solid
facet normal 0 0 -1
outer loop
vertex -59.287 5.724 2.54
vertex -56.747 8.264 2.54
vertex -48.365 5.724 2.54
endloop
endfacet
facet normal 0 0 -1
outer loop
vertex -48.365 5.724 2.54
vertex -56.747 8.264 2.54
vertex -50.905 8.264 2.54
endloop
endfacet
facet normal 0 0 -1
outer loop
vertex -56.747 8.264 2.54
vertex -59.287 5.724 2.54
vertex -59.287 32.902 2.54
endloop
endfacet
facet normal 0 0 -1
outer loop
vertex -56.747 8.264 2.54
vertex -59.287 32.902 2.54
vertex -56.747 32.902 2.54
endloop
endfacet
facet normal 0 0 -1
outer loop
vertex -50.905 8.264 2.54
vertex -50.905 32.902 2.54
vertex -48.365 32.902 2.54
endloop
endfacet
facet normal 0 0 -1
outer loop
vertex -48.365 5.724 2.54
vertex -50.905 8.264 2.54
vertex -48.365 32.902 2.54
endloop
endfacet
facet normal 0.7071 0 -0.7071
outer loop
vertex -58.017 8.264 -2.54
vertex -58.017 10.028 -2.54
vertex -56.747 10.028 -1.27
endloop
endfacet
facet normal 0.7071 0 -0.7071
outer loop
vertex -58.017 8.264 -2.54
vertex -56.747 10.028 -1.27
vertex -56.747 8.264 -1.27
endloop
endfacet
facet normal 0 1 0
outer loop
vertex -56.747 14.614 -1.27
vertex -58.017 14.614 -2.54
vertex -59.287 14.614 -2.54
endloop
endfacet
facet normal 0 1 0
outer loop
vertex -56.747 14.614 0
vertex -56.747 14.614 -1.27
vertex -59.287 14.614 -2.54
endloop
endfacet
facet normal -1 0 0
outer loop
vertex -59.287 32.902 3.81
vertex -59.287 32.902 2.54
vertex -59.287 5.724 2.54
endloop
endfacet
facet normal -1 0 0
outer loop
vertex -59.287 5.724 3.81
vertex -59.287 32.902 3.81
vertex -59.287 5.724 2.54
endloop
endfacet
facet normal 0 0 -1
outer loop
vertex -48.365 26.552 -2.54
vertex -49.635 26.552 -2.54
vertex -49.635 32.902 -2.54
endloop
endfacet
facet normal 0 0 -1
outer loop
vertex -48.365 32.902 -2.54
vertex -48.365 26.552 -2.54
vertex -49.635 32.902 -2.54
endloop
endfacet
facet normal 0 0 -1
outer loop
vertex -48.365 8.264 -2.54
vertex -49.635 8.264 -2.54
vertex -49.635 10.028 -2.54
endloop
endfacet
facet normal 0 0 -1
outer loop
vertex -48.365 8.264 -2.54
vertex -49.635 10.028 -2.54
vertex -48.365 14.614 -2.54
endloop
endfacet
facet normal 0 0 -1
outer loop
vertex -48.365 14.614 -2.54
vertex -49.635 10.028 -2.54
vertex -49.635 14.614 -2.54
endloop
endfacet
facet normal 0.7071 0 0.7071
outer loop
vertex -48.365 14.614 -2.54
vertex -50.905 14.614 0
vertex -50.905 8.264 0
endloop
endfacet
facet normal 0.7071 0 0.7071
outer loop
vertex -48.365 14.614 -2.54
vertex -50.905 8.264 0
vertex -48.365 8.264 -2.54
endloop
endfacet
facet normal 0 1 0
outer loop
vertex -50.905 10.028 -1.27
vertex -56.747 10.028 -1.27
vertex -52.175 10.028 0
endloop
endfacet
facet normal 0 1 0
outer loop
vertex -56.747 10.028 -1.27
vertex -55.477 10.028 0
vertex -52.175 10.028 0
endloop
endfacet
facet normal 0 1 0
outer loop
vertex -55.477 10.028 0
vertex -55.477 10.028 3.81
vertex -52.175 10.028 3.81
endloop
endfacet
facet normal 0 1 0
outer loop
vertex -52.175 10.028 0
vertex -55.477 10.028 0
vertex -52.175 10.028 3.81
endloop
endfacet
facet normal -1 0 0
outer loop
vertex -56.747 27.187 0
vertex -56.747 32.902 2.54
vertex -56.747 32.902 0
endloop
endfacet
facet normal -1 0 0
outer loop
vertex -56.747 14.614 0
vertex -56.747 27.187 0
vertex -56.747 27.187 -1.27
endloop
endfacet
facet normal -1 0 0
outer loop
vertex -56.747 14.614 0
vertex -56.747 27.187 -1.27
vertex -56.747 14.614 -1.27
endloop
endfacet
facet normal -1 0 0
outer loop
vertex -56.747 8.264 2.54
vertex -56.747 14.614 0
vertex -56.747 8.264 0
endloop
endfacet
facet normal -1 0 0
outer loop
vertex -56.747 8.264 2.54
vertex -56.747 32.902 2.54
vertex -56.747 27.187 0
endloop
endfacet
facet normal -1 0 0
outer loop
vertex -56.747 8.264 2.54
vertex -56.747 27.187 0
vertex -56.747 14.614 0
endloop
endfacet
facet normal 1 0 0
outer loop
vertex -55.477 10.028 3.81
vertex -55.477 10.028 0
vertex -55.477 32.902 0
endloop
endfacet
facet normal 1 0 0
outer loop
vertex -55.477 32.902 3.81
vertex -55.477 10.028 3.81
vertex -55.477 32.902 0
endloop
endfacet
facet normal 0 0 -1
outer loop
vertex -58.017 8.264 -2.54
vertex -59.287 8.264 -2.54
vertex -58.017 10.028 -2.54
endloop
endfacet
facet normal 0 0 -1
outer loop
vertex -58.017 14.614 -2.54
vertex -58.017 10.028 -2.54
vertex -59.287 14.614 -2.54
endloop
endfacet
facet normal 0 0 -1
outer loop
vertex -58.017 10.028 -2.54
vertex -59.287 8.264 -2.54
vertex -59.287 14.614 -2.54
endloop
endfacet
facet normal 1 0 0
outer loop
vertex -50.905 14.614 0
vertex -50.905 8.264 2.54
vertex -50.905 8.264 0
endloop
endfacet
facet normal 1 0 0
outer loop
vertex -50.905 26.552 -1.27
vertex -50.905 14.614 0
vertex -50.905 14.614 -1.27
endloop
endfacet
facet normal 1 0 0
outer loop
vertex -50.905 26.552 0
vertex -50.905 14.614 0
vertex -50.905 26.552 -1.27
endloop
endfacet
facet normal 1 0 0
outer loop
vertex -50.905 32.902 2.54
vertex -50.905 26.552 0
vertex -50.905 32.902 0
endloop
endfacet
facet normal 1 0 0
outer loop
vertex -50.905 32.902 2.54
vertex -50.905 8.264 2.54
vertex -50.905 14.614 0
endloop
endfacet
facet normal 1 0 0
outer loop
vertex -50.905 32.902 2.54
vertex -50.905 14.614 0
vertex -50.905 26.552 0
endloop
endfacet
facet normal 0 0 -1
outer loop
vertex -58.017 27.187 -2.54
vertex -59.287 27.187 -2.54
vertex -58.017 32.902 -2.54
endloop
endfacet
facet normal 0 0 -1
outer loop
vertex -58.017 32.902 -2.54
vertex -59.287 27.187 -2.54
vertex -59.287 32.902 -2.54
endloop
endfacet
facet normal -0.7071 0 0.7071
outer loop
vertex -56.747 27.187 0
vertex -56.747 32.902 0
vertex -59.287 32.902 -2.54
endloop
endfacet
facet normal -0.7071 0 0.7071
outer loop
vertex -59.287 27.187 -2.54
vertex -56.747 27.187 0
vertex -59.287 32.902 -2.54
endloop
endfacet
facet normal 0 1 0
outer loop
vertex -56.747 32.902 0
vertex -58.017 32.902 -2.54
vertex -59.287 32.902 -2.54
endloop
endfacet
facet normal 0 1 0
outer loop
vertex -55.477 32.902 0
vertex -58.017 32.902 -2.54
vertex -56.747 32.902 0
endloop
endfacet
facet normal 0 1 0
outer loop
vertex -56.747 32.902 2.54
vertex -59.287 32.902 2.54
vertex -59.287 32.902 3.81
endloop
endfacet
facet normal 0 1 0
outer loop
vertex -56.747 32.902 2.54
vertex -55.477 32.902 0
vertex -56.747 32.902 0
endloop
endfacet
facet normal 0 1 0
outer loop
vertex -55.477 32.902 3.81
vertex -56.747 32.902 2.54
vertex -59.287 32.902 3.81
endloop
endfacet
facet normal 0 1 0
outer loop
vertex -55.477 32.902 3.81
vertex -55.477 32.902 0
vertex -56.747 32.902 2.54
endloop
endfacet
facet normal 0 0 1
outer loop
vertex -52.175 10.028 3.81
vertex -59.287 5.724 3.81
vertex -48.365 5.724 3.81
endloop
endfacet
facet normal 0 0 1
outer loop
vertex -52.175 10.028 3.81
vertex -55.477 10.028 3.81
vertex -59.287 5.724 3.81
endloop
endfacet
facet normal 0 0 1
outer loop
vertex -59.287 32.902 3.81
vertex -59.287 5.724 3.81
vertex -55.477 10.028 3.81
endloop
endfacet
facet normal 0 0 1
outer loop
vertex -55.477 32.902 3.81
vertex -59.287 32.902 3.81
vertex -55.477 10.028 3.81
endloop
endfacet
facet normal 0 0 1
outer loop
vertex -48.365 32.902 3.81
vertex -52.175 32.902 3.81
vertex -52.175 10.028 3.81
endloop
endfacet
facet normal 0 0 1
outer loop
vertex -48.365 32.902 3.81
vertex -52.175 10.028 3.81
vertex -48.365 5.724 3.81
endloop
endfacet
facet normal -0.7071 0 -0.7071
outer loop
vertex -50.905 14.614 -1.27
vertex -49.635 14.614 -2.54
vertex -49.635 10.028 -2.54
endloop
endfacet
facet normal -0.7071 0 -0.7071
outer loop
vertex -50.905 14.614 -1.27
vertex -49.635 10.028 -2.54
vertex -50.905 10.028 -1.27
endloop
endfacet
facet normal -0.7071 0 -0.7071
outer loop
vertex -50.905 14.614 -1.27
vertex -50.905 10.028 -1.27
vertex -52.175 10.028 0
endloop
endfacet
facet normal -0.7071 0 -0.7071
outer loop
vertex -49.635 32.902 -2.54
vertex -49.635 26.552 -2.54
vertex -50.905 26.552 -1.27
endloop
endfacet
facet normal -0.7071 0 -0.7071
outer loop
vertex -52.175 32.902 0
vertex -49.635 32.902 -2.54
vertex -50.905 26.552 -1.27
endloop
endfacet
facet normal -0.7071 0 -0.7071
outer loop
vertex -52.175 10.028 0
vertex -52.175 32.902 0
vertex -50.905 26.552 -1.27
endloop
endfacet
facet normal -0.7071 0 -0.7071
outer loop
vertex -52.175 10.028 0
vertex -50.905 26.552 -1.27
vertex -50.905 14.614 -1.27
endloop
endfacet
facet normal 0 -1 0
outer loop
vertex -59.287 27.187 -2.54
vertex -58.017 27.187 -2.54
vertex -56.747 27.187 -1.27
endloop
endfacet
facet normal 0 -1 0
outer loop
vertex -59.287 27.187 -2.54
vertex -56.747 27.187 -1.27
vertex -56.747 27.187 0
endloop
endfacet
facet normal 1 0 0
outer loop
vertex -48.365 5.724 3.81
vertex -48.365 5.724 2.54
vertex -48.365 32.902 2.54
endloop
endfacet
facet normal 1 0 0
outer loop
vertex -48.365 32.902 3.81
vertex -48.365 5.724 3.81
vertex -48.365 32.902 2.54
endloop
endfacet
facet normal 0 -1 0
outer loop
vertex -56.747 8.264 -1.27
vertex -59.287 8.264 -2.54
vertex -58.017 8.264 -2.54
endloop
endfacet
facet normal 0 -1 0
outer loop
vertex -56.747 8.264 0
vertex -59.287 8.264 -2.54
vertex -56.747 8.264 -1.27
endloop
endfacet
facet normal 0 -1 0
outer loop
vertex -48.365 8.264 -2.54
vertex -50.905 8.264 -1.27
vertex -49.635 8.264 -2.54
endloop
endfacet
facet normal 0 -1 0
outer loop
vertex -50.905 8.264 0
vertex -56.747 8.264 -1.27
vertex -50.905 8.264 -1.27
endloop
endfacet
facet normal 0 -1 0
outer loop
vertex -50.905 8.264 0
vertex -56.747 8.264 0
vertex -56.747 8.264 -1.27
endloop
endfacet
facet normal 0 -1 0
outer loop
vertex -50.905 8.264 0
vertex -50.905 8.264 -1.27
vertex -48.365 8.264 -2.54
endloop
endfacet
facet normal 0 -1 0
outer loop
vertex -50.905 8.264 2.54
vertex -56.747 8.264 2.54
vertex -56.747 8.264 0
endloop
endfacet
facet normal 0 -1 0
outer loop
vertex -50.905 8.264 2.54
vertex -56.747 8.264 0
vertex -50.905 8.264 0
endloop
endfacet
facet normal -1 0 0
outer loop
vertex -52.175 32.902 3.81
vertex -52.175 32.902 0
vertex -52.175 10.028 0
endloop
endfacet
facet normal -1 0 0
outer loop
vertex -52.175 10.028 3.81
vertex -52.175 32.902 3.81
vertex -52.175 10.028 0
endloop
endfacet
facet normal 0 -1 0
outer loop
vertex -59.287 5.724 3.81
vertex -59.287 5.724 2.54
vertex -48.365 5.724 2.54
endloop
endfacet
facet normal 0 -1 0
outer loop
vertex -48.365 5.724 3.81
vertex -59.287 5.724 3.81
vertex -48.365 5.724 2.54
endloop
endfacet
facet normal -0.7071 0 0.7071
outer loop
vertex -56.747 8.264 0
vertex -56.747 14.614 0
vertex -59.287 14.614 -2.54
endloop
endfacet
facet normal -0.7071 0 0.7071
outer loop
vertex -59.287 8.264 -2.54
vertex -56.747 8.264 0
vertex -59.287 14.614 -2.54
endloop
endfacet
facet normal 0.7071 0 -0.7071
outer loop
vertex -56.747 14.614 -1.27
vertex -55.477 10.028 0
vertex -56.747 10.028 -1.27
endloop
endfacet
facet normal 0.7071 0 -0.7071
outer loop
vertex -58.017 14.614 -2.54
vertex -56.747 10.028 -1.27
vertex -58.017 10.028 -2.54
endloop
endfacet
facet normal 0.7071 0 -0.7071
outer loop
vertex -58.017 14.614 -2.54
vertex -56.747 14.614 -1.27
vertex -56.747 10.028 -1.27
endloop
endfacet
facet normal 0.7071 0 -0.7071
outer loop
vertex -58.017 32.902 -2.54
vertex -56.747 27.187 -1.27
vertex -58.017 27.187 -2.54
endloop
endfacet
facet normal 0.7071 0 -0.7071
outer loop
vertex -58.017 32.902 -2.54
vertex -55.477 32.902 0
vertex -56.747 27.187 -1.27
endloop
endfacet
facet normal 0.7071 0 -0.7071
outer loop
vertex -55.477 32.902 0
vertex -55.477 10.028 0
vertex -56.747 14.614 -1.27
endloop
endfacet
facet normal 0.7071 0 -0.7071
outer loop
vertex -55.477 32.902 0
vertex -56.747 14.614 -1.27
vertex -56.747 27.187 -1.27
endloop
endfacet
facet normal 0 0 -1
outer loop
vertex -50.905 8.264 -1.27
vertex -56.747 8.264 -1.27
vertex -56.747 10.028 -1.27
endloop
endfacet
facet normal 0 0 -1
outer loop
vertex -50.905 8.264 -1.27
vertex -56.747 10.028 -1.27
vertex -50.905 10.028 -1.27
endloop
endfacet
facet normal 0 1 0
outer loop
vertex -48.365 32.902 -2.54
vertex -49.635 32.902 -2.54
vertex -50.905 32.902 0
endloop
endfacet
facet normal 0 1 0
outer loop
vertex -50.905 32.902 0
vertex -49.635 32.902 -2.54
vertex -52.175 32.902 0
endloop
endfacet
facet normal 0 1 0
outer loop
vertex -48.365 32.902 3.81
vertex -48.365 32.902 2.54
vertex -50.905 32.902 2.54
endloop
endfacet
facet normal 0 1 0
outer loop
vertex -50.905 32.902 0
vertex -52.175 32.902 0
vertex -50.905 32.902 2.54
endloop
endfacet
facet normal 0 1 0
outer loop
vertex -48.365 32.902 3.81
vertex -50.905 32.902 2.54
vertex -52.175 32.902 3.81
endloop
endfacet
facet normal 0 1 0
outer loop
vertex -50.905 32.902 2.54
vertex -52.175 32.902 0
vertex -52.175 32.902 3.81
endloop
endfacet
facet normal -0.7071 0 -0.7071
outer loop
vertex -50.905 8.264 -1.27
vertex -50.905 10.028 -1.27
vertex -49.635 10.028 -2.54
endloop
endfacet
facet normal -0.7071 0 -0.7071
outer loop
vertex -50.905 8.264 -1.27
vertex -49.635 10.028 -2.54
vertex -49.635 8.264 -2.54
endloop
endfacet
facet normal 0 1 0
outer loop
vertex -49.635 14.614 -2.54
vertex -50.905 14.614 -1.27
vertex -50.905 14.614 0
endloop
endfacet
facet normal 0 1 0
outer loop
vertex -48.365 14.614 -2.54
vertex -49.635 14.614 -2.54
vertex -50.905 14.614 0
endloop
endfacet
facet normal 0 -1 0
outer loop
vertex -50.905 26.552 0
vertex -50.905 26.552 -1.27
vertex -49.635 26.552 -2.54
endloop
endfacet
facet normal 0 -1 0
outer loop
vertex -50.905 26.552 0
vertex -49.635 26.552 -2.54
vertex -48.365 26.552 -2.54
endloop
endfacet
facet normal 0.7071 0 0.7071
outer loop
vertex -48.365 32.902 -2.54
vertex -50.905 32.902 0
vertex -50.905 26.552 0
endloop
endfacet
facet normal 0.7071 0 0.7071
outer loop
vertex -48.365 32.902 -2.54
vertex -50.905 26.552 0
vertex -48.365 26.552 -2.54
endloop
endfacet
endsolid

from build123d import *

# Parameters (mm, degrees)
F1_DEPTH      = 2.54
F1_DEPTH_BACK = 2.54
F2_W          = 3.81
F2_H          = 24.638
F2_W_2        = 2.54
F3_DEPTH      = 1.27
F4_W          = 5.715
F4_H          = 2.54
F4_W_2        = 6.35
F6_DEPTH      = 2.54
F5_W          = 6.35
F5_H          = 2.54
F7_DEPTH      = 2.54
F8_T1_DEPTH   = 22.8740361466
F8_T6_DEPTH   = 6.35
F8_T11_DEPTH  = 6.35
F8_T16_DEPTH  = 6.35
F8_T21_DEPTH  = 5.715
F9_W          = 5.842
F9_H          = 1.7639638534
F10_DEPTH     = 1.27
F11_SIZE      = 1.26999


# Not quite as in the source:
# - a fillet or chamfer that OpenCascade refuses, or shapes differently, is made with other operations: its cross-section is extruded or revolved along the edge and cut away or added
# - a fillet or chamfer is up to 0.001 mm smaller than in the source, because OpenCascade refuses the exact size


with BuildPart() as f1:
    # F0 (on Top) → F1 (new body, two sides)
    with BuildSketch(Plane.XY) as f1_sk:
        Polygon((-55.4767026412, 32.9021683285), (-56.7467026412, 32.9021683285), (-56.7467026412, 8.2641683285), (-50.9047026412, 8.2641683285), (-50.9047026412, 32.9021683285), (-52.1747026412, 32.9021683285), (-52.1747026412, 10.0281321819), (-55.4767026412, 10.0281321819), align=None)
    extrude(amount=F1_DEPTH)
    extrude(f1_sk.sketch, amount=-F1_DEPTH_BACK)

    # F2 (on face) → F3 (join)
    with BuildSketch(Plane.XY.offset(2.54)):
        with Locations((-57.3817026412, 20.5831683285)):
            Rectangle(F2_W, F2_H)
        Polygon((-50.9047026412, 8.2641683285), (-55.4767026412, 8.2641683285), (-59.2867026412, 8.2641683285), (-59.2867026412, 5.7241683285), (-48.3647026412, 5.7241683285), (-48.3647026412, 8.2641683285), align=None)
        with Locations((-49.6347026412, 20.5831683285)):
            Rectangle(F2_W_2, F2_H)
        Polygon((-52.1747026412, 10.0281321819), (-55.4767026412, 10.0281321819), (-55.4767026412, 8.2641683285), (-50.9047026412, 8.2641683285), (-50.9047026412, 32.9021683285), (-52.1747026412, 32.9021683285), align=None)
    extrude(amount=F3_DEPTH)

    # F4 (on face) → F6 (join)
    with BuildSketch(Plane(origin=(-56.7467026412, 0, 0), x_dir=(0, -1, 0), z_dir=(-1, 0, 0))):
        with Locations((-30.0446683285, -1.27)):
            Rectangle(F4_W, F4_H)
        with Locations((-11.4391683285, -1.27)):
            Rectangle(F4_W_2, F4_H)
    extrude(amount=F6_DEPTH)

    # F5 (on face) → F7 (join)
    with BuildSketch(Plane.YZ.offset(-50.9047026412)):
        with Locations((29.7271683285, -1.27)):
            Rectangle(F5_W, F5_H)
        with Locations((11.4391683285, -1.27)):
            Rectangle(F5_W, F5_H)
    extrude(amount=F7_DEPTH)

    # F8: chamfer of 2.54 on 6 edges, made by hand

    # F8_s2 → F8_t1 (cut)
    with BuildSketch(Plane.XZ.offset(-32.9021683285)):
        with BuildLine():
            Line((-49.5628605923, -2.611842049), (-52.2465446902, 0.071842049))
            Line((-52.2465446902, 0.071842049), (-52.2973446902, 0.071842049))
            ThreePointArc((-52.2973446902, 0.071842049), (-52.2255026412, -1.2340789755), (-52.2255026412, -2.54))
            Line((-52.2255026412, -2.54), (-52.1747026412, -2.5908))
            ThreePointArc((-52.1747026412, -2.5908), (-50.8687816168, -2.5908), (-49.5628605923, -2.662642049))
            Line((-49.5628605923, -2.662642049), (-49.5628605923, -2.611842049))
        make_face()
        with BuildLine():
            Line((-55.4048605923, 0.071842049), (-58.0885446902, -2.611842049))
            Line((-58.0885446902, -2.611842049), (-58.0885446902, -2.662642049))
            ThreePointArc((-58.0885446902, -2.662642049), (-56.7826236657, -2.5908), (-55.4767026412, -2.5908))
            Line((-55.4767026412, -2.5908), (-55.4259026412, -2.54))
            ThreePointArc((-55.4259026412, -2.54), (-55.4259026412, -1.2340789755), (-55.3540605923, 0.071842049))
            Line((-55.3540605923, 0.071842049), (-55.4048605923, 0.071842049))
        make_face()
    extrude(amount=F8_T1_DEPTH, mode=Mode.SUBTRACT)


with BuildPart() as f8_tool4:
    # F8_s5 → F8_t6 (new body)
    with BuildSketch(Plane.XZ.offset(-32.9021683285)):
        with BuildLine():
            Line((-50.9765446902, 0.071842049), (-48.2928605923, -2.611842049))
            Line((-48.2928605923, -2.611842049), (-48.2420605923, -2.611842049))
            ThreePointArc((-48.2420605923, -2.611842049), (-48.3139026412, -1.3059210245), (-48.3139026412, 0))
            Line((-48.3139026412, 0), (-48.3647026412, 0.0508))
            ThreePointArc((-48.3647026412, 0.0508), (-49.6706236657, 0.0508), (-50.9765446902, 0.122642049))
            Line((-50.9765446902, 0.122642049), (-50.9765446902, 0.071842049))
        make_face()
    extrude(amount=F8_T6_DEPTH)

    split(bisect_by=Plane.YZ.offset(-50.9047026412), keep=Keep.TOP)


with BuildPart() as f1_1:
    add(f1.part)

    # F8_t3: cut F8_tool4
    add(f8_tool4.part, mode=Mode.SUBTRACT)


with BuildPart() as f8_tool9:
    # F8_s10 → F8_t11 (new body)
    with BuildSketch(Plane.XZ.offset(-14.6141683285)):
        with BuildLine():
            Line((-50.9765446902, 0.071842049), (-48.2928605923, -2.611842049))
            Line((-48.2928605923, -2.611842049), (-48.2420605923, -2.611842049))
            ThreePointArc((-48.2420605923, -2.611842049), (-48.3139026412, -1.3059210245), (-48.3139026412, 0))
            Line((-48.3139026412, 0), (-48.3647026412, 0.0508))
            ThreePointArc((-48.3647026412, 0.0508), (-49.6706236657, 0.0508), (-50.9765446902, 0.122642049))
            Line((-50.9765446902, 0.122642049), (-50.9765446902, 0.071842049))
        make_face()
    extrude(amount=F8_T11_DEPTH)

    split(bisect_by=Plane.YZ.offset(-50.9047026412), keep=Keep.TOP)


with BuildPart() as f1_2:
    add(f1_1.part)

    # F8_t8: cut F8_tool9
    add(f8_tool9.part, mode=Mode.SUBTRACT)


with BuildPart() as f8_tool14:
    # F8_s15 → F8_t16 (new body)
    with BuildSketch(Plane.XZ.offset(-8.2641683285)):
        with BuildLine():
            Line((-56.6748605923, 0.071842049), (-59.3585446902, -2.611842049))
            Line((-59.3585446902, -2.611842049), (-59.4093446902, -2.611842049))
            ThreePointArc((-59.4093446902, -2.611842049), (-59.3375026412, -1.3059210245), (-59.3375026412, 0))
            Line((-59.3375026412, 0), (-59.2867026412, 0.0508))
            ThreePointArc((-59.2867026412, 0.0508), (-57.9807816168, 0.0508), (-56.6748605923, 0.122642049))
            Line((-56.6748605923, 0.122642049), (-56.6748605923, 0.071842049))
        make_face()
    extrude(amount=-F8_T16_DEPTH)

    split(bisect_by=Plane.YZ.offset(-56.7467026412), keep=Keep.BOTTOM)


with BuildPart() as f1_3:
    add(f1_2.part)

    # F8_t13: cut F8_tool14
    add(f8_tool14.part, mode=Mode.SUBTRACT)


with BuildPart() as f8_tool19:
    # F8_s20 → F8_t21 (new body)
    with BuildSketch(Plane.XZ.offset(-27.1871683285)):
        with BuildLine():
            Line((-56.6748605923, 0.071842049), (-59.3585446902, -2.611842049))
            Line((-59.3585446902, -2.611842049), (-59.4093446902, -2.611842049))
            ThreePointArc((-59.4093446902, -2.611842049), (-59.3375026412, -1.3059210245), (-59.3375026412, 0))
            Line((-59.3375026412, 0), (-59.2867026412, 0.0508))
            ThreePointArc((-59.2867026412, 0.0508), (-57.9807816168, 0.0508), (-56.6748605923, 0.122642049))
            Line((-56.6748605923, 0.122642049), (-56.6748605923, 0.071842049))
        make_face()
    extrude(amount=-F8_T21_DEPTH)

    split(bisect_by=Plane.YZ.offset(-56.7467026412), keep=Keep.BOTTOM)


with BuildPart() as f1_4:
    add(f1_3.part)

    # F8_t18: cut F8_tool19
    add(f8_tool19.part, mode=Mode.SUBTRACT)

    # F9 (on face) → F10 (cut)
    with BuildSketch(Plane(origin=(0, 0, -2.54), x_dir=(1, 0, 0), z_dir=(0, 0, -1))):
        with Locations((-53.8257026412, -9.1461502552)):
            Rectangle(F9_W, F9_H)
    extrude(amount=-F10_DEPTH, mode=Mode.SUBTRACT)

    # F11 (size 1.27 in the source; OpenCascade refuses exactly that, so slightly less here)
    f11_edges = [f1_4.edges().sort_by_distance(p)[0] for p in [
        (-50.904703, 9.14615, -2.54),
        (-56.746703, 9.14615, -2.54),
    ]]
    chamfer(f11_edges, length=F11_SIZE)


solid = f1_4.part
